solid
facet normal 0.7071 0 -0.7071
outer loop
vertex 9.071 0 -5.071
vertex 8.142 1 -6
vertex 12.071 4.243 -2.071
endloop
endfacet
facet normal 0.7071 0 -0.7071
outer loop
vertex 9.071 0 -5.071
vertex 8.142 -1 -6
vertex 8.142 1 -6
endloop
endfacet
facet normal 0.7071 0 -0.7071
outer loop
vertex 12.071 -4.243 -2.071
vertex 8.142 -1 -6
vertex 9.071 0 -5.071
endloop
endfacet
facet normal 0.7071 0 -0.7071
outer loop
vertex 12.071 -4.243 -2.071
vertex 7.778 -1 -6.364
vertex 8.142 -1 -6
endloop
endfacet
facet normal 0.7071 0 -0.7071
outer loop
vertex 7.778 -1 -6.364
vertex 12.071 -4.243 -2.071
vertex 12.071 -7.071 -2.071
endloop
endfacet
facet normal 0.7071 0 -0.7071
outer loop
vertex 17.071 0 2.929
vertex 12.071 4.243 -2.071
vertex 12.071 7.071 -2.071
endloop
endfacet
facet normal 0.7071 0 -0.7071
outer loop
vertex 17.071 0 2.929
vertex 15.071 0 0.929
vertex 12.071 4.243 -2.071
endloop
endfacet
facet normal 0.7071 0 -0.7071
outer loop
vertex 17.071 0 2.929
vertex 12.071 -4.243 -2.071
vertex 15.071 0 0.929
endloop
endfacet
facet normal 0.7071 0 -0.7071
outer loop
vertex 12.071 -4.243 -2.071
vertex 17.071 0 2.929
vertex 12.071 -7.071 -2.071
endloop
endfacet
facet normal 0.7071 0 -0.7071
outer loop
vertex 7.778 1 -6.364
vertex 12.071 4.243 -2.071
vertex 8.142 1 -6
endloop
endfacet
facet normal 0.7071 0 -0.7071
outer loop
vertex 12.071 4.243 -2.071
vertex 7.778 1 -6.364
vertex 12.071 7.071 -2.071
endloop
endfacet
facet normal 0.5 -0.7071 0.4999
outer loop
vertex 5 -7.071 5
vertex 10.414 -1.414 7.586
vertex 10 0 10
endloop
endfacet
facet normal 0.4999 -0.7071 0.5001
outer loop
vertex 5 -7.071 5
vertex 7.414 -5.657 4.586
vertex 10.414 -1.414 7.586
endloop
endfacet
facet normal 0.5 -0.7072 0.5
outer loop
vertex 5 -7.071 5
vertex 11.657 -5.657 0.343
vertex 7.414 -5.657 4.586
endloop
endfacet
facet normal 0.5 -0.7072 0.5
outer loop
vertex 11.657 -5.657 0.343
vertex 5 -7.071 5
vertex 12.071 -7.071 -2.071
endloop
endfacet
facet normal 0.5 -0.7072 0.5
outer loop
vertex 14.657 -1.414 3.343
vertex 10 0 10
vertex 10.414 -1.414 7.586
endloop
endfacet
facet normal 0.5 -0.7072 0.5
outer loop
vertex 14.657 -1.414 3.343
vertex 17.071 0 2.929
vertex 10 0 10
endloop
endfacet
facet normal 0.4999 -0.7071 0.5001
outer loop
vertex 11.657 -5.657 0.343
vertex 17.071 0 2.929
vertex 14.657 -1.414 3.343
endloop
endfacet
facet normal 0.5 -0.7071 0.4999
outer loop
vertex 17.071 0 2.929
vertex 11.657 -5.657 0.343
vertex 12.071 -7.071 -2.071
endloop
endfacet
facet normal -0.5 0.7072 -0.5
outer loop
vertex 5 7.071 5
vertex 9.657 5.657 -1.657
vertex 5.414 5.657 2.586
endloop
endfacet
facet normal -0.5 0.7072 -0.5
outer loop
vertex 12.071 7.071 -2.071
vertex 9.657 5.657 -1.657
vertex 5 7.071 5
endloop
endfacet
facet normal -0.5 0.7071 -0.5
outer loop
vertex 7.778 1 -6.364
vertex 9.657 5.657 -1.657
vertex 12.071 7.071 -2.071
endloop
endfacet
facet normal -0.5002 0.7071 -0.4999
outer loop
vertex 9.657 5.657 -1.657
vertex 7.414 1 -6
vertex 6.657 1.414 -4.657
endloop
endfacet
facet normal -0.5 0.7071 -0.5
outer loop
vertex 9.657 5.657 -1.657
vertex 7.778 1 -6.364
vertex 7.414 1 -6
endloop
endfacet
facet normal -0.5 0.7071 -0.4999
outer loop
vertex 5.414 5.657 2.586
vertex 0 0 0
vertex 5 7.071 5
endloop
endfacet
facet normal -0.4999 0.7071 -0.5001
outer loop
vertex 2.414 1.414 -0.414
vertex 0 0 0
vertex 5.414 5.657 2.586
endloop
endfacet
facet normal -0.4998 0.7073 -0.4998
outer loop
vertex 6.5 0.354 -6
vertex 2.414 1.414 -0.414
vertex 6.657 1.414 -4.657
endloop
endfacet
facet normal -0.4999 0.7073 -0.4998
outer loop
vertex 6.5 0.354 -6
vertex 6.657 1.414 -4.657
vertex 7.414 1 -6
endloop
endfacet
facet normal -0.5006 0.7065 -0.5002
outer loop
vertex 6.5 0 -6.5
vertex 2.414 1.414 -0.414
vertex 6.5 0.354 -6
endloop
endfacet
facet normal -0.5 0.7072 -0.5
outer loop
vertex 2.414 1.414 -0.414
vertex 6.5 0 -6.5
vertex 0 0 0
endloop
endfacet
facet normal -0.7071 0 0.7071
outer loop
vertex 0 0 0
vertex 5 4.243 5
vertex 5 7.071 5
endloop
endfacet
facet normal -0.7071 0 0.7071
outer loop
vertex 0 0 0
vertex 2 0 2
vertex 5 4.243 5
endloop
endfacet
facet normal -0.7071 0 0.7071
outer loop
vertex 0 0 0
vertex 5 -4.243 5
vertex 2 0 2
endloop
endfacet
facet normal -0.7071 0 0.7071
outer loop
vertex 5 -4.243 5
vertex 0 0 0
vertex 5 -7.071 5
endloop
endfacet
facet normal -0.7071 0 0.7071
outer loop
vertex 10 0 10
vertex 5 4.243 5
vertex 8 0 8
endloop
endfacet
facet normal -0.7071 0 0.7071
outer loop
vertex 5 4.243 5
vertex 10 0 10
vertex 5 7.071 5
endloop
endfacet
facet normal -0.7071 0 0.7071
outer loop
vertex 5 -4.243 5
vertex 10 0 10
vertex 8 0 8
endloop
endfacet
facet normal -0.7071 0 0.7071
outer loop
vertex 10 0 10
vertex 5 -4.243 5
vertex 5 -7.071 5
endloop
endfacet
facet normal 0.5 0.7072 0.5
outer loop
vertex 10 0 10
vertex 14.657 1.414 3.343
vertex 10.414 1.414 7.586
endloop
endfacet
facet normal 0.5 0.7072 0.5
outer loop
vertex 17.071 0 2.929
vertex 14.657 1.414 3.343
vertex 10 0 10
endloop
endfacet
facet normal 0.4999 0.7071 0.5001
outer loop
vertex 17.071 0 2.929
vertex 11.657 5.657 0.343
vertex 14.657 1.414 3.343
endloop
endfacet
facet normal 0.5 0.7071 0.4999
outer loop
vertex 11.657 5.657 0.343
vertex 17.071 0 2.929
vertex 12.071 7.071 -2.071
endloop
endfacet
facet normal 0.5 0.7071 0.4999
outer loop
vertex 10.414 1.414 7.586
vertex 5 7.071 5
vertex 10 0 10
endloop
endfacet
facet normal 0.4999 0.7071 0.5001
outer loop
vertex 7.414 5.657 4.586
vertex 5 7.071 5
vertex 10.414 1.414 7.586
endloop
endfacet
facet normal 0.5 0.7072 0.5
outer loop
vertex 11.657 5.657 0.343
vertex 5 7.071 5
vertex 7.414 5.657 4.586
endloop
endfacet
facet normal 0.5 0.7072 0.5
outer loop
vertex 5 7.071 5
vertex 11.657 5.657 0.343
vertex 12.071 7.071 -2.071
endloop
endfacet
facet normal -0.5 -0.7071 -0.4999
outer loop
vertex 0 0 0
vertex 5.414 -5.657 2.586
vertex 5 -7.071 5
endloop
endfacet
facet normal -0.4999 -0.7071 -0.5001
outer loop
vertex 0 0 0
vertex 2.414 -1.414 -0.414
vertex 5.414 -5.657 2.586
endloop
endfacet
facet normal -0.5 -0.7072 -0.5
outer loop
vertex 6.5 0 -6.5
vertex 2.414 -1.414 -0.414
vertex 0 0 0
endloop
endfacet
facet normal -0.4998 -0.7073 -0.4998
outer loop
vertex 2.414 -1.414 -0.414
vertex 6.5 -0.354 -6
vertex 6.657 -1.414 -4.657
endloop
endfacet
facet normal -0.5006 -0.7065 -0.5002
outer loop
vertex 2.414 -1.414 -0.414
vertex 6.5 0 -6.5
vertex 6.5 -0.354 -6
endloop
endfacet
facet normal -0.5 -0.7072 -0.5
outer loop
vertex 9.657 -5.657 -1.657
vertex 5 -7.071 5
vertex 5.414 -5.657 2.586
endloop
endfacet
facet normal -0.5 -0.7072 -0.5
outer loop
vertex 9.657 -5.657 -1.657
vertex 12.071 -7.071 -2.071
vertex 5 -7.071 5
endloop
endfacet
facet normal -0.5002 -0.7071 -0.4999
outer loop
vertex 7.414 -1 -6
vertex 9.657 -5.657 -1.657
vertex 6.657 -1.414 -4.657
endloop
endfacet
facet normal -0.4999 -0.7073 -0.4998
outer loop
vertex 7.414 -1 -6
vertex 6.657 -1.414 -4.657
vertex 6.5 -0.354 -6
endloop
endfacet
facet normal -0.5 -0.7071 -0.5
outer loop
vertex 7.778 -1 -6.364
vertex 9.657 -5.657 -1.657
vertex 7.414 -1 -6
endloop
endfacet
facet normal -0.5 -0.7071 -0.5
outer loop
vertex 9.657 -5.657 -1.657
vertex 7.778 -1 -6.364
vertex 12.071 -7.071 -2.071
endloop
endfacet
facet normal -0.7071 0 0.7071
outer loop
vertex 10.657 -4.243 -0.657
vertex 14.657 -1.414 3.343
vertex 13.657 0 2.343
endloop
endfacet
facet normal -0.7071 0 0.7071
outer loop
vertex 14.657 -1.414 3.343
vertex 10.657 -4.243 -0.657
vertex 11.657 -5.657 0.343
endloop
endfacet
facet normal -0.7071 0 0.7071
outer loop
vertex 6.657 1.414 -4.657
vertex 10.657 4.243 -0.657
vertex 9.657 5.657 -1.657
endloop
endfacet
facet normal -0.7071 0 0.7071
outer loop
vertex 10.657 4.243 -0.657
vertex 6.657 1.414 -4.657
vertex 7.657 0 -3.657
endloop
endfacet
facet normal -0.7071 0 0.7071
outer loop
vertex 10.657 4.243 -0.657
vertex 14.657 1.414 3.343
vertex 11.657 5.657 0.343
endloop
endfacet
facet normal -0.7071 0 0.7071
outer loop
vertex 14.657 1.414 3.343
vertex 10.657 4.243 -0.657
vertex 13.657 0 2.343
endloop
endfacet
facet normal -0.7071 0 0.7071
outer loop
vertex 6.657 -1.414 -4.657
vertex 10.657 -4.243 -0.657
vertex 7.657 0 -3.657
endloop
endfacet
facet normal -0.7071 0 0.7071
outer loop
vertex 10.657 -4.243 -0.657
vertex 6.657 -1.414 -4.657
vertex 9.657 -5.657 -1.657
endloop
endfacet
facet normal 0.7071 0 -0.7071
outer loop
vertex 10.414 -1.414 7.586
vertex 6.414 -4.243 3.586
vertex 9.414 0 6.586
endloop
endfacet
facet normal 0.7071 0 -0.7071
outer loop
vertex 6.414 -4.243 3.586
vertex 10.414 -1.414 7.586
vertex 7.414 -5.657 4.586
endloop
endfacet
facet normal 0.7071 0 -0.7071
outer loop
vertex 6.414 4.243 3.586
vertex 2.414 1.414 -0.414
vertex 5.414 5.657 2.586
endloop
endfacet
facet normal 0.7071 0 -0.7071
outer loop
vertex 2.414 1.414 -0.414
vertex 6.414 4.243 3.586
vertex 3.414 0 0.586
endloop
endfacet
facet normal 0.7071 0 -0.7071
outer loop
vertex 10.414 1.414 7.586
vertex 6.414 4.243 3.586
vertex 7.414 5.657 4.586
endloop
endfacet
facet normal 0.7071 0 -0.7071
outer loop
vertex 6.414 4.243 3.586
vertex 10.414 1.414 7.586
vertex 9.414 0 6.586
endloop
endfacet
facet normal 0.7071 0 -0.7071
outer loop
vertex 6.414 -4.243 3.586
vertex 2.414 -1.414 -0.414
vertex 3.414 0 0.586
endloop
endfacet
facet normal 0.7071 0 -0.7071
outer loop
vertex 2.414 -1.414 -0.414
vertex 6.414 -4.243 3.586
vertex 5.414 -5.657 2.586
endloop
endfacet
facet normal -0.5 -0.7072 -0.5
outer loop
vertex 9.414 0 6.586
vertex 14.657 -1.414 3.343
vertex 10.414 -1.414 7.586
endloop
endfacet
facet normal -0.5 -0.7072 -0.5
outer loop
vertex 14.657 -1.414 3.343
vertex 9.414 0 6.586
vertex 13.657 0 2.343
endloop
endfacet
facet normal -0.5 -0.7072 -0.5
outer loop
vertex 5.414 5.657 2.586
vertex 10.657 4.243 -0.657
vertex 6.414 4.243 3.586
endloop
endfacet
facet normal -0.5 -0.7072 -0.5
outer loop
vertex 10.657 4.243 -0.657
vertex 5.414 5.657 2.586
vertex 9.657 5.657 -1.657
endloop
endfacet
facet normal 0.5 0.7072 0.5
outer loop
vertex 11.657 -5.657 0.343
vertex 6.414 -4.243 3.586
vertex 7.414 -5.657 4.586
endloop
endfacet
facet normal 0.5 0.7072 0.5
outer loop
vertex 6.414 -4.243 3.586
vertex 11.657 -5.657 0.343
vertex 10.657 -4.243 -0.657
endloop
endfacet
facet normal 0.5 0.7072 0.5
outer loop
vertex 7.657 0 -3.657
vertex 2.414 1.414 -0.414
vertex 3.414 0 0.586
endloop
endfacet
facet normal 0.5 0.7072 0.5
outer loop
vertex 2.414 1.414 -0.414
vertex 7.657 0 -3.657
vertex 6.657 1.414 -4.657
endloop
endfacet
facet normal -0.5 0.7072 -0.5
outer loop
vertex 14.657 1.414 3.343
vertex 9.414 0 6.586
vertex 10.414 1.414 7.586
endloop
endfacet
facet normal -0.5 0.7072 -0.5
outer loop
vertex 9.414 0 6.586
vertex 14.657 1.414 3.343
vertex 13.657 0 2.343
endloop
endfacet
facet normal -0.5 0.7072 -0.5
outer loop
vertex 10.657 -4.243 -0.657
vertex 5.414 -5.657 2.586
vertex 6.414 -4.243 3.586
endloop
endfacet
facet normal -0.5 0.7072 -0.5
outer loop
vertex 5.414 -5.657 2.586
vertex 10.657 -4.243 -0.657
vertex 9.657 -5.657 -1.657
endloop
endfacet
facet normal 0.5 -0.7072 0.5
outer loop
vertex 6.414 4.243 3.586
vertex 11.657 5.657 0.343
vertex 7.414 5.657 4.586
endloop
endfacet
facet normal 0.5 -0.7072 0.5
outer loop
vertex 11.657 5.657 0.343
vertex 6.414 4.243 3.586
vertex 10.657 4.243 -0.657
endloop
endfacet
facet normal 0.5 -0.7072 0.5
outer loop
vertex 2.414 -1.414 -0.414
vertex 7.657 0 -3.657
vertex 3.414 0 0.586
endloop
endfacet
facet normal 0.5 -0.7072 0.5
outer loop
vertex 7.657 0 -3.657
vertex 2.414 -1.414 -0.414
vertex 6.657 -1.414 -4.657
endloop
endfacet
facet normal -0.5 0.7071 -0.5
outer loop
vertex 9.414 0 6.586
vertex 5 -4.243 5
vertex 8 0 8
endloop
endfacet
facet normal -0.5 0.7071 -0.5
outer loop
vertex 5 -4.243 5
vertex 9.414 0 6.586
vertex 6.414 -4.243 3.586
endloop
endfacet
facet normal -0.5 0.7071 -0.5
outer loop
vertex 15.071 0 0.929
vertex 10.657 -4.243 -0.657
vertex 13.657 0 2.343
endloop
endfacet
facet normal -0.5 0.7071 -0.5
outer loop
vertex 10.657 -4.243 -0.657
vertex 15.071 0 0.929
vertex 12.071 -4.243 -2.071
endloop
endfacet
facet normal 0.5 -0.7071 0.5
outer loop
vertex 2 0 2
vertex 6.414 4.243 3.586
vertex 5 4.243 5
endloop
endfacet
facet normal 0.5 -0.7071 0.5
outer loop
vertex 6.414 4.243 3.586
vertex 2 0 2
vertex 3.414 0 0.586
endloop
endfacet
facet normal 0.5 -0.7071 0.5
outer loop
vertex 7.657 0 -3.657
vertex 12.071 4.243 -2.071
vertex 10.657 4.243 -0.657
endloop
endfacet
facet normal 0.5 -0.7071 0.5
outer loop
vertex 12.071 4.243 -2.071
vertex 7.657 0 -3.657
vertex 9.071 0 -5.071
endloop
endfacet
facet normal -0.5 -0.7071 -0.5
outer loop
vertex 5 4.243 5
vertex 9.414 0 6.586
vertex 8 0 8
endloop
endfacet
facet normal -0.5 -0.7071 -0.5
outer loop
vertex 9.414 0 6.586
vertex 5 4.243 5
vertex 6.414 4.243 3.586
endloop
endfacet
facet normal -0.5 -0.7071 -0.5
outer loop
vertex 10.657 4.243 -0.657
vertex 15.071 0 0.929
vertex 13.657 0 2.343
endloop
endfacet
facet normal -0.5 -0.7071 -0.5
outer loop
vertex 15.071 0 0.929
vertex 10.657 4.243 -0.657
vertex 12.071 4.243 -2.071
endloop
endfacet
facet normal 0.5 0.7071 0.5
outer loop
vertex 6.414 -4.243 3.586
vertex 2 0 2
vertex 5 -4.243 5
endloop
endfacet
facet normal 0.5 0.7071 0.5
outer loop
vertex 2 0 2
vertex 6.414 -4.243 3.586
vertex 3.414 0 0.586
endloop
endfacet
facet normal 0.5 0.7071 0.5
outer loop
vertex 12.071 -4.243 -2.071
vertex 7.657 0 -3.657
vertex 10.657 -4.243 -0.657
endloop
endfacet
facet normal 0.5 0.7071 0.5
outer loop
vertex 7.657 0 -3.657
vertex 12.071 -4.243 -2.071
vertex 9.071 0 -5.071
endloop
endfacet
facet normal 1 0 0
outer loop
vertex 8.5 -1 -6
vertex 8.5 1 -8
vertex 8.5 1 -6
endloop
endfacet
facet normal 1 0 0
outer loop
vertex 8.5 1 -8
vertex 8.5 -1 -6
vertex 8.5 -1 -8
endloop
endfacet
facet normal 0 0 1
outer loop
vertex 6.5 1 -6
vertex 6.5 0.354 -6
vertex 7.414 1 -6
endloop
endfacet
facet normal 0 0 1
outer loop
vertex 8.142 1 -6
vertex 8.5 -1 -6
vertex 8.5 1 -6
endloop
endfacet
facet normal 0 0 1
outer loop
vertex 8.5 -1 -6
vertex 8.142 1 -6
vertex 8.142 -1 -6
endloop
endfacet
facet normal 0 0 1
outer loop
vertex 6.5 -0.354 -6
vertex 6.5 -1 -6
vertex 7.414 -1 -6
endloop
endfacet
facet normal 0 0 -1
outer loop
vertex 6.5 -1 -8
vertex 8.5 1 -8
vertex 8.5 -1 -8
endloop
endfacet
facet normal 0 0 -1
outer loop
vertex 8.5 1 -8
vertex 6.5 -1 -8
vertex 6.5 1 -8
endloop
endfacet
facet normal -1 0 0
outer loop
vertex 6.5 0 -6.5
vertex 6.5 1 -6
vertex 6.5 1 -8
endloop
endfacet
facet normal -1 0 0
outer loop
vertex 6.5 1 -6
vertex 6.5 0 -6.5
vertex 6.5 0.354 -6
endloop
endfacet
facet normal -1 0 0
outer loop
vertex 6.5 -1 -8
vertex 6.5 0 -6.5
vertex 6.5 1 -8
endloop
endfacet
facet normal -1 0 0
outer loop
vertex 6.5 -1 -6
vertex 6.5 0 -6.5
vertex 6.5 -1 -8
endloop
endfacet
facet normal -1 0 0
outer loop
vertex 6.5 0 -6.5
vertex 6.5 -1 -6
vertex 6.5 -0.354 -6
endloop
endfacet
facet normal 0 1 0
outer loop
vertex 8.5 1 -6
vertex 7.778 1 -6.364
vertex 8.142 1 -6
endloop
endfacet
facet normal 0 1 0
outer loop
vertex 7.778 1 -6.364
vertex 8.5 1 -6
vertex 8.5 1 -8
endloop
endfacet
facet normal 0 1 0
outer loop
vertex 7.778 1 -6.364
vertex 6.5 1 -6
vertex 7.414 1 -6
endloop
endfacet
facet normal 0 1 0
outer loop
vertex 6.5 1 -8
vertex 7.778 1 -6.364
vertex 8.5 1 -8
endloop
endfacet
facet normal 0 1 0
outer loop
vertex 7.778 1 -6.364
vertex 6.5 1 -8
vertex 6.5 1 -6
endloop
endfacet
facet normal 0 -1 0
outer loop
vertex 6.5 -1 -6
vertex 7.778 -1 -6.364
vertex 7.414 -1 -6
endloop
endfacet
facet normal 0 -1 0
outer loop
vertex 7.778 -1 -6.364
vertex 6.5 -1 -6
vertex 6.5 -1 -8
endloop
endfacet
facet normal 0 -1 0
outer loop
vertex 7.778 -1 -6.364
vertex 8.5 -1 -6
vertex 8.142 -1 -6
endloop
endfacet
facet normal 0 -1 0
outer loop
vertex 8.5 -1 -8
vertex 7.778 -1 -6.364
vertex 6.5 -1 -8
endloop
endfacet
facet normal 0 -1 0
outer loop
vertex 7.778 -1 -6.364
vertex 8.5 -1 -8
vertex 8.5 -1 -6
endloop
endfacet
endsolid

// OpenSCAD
s=10;
e=2;
rotate([45,45,0])
difference(){
    cube([s,s,s]);
    
    translate([e,e,0])
    cube([s - 2*e,s - 2*e,s]);
    
    translate([e,0,e])
    cube([s - 2*e,s,s - 2*e]);
    
    translate([0,e,e])
    cube([s,s - 2*e,s - 2*e]);
}

translate([6.5,-1,-8])
cube(2,2,1);
